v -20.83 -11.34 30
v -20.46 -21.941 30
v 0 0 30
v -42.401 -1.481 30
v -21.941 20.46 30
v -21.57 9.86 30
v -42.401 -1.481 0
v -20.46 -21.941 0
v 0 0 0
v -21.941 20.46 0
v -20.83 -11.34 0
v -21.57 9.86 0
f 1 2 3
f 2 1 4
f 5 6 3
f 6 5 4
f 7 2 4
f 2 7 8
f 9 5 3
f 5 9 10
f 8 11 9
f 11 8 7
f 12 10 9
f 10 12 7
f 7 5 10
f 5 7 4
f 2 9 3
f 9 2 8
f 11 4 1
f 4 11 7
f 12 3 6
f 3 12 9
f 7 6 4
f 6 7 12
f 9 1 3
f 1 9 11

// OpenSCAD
rotate([0,0,92])
rotate([0,-90,0]){
    difference(){
        rotate([-45,0,0]) {
            cube([30, 30, 30]);
        }
        scale([1,1,0.5]) {
            rotate([-45,0,0]) {
                cube([30, 30, 30]);
            }
        }
    }
}
